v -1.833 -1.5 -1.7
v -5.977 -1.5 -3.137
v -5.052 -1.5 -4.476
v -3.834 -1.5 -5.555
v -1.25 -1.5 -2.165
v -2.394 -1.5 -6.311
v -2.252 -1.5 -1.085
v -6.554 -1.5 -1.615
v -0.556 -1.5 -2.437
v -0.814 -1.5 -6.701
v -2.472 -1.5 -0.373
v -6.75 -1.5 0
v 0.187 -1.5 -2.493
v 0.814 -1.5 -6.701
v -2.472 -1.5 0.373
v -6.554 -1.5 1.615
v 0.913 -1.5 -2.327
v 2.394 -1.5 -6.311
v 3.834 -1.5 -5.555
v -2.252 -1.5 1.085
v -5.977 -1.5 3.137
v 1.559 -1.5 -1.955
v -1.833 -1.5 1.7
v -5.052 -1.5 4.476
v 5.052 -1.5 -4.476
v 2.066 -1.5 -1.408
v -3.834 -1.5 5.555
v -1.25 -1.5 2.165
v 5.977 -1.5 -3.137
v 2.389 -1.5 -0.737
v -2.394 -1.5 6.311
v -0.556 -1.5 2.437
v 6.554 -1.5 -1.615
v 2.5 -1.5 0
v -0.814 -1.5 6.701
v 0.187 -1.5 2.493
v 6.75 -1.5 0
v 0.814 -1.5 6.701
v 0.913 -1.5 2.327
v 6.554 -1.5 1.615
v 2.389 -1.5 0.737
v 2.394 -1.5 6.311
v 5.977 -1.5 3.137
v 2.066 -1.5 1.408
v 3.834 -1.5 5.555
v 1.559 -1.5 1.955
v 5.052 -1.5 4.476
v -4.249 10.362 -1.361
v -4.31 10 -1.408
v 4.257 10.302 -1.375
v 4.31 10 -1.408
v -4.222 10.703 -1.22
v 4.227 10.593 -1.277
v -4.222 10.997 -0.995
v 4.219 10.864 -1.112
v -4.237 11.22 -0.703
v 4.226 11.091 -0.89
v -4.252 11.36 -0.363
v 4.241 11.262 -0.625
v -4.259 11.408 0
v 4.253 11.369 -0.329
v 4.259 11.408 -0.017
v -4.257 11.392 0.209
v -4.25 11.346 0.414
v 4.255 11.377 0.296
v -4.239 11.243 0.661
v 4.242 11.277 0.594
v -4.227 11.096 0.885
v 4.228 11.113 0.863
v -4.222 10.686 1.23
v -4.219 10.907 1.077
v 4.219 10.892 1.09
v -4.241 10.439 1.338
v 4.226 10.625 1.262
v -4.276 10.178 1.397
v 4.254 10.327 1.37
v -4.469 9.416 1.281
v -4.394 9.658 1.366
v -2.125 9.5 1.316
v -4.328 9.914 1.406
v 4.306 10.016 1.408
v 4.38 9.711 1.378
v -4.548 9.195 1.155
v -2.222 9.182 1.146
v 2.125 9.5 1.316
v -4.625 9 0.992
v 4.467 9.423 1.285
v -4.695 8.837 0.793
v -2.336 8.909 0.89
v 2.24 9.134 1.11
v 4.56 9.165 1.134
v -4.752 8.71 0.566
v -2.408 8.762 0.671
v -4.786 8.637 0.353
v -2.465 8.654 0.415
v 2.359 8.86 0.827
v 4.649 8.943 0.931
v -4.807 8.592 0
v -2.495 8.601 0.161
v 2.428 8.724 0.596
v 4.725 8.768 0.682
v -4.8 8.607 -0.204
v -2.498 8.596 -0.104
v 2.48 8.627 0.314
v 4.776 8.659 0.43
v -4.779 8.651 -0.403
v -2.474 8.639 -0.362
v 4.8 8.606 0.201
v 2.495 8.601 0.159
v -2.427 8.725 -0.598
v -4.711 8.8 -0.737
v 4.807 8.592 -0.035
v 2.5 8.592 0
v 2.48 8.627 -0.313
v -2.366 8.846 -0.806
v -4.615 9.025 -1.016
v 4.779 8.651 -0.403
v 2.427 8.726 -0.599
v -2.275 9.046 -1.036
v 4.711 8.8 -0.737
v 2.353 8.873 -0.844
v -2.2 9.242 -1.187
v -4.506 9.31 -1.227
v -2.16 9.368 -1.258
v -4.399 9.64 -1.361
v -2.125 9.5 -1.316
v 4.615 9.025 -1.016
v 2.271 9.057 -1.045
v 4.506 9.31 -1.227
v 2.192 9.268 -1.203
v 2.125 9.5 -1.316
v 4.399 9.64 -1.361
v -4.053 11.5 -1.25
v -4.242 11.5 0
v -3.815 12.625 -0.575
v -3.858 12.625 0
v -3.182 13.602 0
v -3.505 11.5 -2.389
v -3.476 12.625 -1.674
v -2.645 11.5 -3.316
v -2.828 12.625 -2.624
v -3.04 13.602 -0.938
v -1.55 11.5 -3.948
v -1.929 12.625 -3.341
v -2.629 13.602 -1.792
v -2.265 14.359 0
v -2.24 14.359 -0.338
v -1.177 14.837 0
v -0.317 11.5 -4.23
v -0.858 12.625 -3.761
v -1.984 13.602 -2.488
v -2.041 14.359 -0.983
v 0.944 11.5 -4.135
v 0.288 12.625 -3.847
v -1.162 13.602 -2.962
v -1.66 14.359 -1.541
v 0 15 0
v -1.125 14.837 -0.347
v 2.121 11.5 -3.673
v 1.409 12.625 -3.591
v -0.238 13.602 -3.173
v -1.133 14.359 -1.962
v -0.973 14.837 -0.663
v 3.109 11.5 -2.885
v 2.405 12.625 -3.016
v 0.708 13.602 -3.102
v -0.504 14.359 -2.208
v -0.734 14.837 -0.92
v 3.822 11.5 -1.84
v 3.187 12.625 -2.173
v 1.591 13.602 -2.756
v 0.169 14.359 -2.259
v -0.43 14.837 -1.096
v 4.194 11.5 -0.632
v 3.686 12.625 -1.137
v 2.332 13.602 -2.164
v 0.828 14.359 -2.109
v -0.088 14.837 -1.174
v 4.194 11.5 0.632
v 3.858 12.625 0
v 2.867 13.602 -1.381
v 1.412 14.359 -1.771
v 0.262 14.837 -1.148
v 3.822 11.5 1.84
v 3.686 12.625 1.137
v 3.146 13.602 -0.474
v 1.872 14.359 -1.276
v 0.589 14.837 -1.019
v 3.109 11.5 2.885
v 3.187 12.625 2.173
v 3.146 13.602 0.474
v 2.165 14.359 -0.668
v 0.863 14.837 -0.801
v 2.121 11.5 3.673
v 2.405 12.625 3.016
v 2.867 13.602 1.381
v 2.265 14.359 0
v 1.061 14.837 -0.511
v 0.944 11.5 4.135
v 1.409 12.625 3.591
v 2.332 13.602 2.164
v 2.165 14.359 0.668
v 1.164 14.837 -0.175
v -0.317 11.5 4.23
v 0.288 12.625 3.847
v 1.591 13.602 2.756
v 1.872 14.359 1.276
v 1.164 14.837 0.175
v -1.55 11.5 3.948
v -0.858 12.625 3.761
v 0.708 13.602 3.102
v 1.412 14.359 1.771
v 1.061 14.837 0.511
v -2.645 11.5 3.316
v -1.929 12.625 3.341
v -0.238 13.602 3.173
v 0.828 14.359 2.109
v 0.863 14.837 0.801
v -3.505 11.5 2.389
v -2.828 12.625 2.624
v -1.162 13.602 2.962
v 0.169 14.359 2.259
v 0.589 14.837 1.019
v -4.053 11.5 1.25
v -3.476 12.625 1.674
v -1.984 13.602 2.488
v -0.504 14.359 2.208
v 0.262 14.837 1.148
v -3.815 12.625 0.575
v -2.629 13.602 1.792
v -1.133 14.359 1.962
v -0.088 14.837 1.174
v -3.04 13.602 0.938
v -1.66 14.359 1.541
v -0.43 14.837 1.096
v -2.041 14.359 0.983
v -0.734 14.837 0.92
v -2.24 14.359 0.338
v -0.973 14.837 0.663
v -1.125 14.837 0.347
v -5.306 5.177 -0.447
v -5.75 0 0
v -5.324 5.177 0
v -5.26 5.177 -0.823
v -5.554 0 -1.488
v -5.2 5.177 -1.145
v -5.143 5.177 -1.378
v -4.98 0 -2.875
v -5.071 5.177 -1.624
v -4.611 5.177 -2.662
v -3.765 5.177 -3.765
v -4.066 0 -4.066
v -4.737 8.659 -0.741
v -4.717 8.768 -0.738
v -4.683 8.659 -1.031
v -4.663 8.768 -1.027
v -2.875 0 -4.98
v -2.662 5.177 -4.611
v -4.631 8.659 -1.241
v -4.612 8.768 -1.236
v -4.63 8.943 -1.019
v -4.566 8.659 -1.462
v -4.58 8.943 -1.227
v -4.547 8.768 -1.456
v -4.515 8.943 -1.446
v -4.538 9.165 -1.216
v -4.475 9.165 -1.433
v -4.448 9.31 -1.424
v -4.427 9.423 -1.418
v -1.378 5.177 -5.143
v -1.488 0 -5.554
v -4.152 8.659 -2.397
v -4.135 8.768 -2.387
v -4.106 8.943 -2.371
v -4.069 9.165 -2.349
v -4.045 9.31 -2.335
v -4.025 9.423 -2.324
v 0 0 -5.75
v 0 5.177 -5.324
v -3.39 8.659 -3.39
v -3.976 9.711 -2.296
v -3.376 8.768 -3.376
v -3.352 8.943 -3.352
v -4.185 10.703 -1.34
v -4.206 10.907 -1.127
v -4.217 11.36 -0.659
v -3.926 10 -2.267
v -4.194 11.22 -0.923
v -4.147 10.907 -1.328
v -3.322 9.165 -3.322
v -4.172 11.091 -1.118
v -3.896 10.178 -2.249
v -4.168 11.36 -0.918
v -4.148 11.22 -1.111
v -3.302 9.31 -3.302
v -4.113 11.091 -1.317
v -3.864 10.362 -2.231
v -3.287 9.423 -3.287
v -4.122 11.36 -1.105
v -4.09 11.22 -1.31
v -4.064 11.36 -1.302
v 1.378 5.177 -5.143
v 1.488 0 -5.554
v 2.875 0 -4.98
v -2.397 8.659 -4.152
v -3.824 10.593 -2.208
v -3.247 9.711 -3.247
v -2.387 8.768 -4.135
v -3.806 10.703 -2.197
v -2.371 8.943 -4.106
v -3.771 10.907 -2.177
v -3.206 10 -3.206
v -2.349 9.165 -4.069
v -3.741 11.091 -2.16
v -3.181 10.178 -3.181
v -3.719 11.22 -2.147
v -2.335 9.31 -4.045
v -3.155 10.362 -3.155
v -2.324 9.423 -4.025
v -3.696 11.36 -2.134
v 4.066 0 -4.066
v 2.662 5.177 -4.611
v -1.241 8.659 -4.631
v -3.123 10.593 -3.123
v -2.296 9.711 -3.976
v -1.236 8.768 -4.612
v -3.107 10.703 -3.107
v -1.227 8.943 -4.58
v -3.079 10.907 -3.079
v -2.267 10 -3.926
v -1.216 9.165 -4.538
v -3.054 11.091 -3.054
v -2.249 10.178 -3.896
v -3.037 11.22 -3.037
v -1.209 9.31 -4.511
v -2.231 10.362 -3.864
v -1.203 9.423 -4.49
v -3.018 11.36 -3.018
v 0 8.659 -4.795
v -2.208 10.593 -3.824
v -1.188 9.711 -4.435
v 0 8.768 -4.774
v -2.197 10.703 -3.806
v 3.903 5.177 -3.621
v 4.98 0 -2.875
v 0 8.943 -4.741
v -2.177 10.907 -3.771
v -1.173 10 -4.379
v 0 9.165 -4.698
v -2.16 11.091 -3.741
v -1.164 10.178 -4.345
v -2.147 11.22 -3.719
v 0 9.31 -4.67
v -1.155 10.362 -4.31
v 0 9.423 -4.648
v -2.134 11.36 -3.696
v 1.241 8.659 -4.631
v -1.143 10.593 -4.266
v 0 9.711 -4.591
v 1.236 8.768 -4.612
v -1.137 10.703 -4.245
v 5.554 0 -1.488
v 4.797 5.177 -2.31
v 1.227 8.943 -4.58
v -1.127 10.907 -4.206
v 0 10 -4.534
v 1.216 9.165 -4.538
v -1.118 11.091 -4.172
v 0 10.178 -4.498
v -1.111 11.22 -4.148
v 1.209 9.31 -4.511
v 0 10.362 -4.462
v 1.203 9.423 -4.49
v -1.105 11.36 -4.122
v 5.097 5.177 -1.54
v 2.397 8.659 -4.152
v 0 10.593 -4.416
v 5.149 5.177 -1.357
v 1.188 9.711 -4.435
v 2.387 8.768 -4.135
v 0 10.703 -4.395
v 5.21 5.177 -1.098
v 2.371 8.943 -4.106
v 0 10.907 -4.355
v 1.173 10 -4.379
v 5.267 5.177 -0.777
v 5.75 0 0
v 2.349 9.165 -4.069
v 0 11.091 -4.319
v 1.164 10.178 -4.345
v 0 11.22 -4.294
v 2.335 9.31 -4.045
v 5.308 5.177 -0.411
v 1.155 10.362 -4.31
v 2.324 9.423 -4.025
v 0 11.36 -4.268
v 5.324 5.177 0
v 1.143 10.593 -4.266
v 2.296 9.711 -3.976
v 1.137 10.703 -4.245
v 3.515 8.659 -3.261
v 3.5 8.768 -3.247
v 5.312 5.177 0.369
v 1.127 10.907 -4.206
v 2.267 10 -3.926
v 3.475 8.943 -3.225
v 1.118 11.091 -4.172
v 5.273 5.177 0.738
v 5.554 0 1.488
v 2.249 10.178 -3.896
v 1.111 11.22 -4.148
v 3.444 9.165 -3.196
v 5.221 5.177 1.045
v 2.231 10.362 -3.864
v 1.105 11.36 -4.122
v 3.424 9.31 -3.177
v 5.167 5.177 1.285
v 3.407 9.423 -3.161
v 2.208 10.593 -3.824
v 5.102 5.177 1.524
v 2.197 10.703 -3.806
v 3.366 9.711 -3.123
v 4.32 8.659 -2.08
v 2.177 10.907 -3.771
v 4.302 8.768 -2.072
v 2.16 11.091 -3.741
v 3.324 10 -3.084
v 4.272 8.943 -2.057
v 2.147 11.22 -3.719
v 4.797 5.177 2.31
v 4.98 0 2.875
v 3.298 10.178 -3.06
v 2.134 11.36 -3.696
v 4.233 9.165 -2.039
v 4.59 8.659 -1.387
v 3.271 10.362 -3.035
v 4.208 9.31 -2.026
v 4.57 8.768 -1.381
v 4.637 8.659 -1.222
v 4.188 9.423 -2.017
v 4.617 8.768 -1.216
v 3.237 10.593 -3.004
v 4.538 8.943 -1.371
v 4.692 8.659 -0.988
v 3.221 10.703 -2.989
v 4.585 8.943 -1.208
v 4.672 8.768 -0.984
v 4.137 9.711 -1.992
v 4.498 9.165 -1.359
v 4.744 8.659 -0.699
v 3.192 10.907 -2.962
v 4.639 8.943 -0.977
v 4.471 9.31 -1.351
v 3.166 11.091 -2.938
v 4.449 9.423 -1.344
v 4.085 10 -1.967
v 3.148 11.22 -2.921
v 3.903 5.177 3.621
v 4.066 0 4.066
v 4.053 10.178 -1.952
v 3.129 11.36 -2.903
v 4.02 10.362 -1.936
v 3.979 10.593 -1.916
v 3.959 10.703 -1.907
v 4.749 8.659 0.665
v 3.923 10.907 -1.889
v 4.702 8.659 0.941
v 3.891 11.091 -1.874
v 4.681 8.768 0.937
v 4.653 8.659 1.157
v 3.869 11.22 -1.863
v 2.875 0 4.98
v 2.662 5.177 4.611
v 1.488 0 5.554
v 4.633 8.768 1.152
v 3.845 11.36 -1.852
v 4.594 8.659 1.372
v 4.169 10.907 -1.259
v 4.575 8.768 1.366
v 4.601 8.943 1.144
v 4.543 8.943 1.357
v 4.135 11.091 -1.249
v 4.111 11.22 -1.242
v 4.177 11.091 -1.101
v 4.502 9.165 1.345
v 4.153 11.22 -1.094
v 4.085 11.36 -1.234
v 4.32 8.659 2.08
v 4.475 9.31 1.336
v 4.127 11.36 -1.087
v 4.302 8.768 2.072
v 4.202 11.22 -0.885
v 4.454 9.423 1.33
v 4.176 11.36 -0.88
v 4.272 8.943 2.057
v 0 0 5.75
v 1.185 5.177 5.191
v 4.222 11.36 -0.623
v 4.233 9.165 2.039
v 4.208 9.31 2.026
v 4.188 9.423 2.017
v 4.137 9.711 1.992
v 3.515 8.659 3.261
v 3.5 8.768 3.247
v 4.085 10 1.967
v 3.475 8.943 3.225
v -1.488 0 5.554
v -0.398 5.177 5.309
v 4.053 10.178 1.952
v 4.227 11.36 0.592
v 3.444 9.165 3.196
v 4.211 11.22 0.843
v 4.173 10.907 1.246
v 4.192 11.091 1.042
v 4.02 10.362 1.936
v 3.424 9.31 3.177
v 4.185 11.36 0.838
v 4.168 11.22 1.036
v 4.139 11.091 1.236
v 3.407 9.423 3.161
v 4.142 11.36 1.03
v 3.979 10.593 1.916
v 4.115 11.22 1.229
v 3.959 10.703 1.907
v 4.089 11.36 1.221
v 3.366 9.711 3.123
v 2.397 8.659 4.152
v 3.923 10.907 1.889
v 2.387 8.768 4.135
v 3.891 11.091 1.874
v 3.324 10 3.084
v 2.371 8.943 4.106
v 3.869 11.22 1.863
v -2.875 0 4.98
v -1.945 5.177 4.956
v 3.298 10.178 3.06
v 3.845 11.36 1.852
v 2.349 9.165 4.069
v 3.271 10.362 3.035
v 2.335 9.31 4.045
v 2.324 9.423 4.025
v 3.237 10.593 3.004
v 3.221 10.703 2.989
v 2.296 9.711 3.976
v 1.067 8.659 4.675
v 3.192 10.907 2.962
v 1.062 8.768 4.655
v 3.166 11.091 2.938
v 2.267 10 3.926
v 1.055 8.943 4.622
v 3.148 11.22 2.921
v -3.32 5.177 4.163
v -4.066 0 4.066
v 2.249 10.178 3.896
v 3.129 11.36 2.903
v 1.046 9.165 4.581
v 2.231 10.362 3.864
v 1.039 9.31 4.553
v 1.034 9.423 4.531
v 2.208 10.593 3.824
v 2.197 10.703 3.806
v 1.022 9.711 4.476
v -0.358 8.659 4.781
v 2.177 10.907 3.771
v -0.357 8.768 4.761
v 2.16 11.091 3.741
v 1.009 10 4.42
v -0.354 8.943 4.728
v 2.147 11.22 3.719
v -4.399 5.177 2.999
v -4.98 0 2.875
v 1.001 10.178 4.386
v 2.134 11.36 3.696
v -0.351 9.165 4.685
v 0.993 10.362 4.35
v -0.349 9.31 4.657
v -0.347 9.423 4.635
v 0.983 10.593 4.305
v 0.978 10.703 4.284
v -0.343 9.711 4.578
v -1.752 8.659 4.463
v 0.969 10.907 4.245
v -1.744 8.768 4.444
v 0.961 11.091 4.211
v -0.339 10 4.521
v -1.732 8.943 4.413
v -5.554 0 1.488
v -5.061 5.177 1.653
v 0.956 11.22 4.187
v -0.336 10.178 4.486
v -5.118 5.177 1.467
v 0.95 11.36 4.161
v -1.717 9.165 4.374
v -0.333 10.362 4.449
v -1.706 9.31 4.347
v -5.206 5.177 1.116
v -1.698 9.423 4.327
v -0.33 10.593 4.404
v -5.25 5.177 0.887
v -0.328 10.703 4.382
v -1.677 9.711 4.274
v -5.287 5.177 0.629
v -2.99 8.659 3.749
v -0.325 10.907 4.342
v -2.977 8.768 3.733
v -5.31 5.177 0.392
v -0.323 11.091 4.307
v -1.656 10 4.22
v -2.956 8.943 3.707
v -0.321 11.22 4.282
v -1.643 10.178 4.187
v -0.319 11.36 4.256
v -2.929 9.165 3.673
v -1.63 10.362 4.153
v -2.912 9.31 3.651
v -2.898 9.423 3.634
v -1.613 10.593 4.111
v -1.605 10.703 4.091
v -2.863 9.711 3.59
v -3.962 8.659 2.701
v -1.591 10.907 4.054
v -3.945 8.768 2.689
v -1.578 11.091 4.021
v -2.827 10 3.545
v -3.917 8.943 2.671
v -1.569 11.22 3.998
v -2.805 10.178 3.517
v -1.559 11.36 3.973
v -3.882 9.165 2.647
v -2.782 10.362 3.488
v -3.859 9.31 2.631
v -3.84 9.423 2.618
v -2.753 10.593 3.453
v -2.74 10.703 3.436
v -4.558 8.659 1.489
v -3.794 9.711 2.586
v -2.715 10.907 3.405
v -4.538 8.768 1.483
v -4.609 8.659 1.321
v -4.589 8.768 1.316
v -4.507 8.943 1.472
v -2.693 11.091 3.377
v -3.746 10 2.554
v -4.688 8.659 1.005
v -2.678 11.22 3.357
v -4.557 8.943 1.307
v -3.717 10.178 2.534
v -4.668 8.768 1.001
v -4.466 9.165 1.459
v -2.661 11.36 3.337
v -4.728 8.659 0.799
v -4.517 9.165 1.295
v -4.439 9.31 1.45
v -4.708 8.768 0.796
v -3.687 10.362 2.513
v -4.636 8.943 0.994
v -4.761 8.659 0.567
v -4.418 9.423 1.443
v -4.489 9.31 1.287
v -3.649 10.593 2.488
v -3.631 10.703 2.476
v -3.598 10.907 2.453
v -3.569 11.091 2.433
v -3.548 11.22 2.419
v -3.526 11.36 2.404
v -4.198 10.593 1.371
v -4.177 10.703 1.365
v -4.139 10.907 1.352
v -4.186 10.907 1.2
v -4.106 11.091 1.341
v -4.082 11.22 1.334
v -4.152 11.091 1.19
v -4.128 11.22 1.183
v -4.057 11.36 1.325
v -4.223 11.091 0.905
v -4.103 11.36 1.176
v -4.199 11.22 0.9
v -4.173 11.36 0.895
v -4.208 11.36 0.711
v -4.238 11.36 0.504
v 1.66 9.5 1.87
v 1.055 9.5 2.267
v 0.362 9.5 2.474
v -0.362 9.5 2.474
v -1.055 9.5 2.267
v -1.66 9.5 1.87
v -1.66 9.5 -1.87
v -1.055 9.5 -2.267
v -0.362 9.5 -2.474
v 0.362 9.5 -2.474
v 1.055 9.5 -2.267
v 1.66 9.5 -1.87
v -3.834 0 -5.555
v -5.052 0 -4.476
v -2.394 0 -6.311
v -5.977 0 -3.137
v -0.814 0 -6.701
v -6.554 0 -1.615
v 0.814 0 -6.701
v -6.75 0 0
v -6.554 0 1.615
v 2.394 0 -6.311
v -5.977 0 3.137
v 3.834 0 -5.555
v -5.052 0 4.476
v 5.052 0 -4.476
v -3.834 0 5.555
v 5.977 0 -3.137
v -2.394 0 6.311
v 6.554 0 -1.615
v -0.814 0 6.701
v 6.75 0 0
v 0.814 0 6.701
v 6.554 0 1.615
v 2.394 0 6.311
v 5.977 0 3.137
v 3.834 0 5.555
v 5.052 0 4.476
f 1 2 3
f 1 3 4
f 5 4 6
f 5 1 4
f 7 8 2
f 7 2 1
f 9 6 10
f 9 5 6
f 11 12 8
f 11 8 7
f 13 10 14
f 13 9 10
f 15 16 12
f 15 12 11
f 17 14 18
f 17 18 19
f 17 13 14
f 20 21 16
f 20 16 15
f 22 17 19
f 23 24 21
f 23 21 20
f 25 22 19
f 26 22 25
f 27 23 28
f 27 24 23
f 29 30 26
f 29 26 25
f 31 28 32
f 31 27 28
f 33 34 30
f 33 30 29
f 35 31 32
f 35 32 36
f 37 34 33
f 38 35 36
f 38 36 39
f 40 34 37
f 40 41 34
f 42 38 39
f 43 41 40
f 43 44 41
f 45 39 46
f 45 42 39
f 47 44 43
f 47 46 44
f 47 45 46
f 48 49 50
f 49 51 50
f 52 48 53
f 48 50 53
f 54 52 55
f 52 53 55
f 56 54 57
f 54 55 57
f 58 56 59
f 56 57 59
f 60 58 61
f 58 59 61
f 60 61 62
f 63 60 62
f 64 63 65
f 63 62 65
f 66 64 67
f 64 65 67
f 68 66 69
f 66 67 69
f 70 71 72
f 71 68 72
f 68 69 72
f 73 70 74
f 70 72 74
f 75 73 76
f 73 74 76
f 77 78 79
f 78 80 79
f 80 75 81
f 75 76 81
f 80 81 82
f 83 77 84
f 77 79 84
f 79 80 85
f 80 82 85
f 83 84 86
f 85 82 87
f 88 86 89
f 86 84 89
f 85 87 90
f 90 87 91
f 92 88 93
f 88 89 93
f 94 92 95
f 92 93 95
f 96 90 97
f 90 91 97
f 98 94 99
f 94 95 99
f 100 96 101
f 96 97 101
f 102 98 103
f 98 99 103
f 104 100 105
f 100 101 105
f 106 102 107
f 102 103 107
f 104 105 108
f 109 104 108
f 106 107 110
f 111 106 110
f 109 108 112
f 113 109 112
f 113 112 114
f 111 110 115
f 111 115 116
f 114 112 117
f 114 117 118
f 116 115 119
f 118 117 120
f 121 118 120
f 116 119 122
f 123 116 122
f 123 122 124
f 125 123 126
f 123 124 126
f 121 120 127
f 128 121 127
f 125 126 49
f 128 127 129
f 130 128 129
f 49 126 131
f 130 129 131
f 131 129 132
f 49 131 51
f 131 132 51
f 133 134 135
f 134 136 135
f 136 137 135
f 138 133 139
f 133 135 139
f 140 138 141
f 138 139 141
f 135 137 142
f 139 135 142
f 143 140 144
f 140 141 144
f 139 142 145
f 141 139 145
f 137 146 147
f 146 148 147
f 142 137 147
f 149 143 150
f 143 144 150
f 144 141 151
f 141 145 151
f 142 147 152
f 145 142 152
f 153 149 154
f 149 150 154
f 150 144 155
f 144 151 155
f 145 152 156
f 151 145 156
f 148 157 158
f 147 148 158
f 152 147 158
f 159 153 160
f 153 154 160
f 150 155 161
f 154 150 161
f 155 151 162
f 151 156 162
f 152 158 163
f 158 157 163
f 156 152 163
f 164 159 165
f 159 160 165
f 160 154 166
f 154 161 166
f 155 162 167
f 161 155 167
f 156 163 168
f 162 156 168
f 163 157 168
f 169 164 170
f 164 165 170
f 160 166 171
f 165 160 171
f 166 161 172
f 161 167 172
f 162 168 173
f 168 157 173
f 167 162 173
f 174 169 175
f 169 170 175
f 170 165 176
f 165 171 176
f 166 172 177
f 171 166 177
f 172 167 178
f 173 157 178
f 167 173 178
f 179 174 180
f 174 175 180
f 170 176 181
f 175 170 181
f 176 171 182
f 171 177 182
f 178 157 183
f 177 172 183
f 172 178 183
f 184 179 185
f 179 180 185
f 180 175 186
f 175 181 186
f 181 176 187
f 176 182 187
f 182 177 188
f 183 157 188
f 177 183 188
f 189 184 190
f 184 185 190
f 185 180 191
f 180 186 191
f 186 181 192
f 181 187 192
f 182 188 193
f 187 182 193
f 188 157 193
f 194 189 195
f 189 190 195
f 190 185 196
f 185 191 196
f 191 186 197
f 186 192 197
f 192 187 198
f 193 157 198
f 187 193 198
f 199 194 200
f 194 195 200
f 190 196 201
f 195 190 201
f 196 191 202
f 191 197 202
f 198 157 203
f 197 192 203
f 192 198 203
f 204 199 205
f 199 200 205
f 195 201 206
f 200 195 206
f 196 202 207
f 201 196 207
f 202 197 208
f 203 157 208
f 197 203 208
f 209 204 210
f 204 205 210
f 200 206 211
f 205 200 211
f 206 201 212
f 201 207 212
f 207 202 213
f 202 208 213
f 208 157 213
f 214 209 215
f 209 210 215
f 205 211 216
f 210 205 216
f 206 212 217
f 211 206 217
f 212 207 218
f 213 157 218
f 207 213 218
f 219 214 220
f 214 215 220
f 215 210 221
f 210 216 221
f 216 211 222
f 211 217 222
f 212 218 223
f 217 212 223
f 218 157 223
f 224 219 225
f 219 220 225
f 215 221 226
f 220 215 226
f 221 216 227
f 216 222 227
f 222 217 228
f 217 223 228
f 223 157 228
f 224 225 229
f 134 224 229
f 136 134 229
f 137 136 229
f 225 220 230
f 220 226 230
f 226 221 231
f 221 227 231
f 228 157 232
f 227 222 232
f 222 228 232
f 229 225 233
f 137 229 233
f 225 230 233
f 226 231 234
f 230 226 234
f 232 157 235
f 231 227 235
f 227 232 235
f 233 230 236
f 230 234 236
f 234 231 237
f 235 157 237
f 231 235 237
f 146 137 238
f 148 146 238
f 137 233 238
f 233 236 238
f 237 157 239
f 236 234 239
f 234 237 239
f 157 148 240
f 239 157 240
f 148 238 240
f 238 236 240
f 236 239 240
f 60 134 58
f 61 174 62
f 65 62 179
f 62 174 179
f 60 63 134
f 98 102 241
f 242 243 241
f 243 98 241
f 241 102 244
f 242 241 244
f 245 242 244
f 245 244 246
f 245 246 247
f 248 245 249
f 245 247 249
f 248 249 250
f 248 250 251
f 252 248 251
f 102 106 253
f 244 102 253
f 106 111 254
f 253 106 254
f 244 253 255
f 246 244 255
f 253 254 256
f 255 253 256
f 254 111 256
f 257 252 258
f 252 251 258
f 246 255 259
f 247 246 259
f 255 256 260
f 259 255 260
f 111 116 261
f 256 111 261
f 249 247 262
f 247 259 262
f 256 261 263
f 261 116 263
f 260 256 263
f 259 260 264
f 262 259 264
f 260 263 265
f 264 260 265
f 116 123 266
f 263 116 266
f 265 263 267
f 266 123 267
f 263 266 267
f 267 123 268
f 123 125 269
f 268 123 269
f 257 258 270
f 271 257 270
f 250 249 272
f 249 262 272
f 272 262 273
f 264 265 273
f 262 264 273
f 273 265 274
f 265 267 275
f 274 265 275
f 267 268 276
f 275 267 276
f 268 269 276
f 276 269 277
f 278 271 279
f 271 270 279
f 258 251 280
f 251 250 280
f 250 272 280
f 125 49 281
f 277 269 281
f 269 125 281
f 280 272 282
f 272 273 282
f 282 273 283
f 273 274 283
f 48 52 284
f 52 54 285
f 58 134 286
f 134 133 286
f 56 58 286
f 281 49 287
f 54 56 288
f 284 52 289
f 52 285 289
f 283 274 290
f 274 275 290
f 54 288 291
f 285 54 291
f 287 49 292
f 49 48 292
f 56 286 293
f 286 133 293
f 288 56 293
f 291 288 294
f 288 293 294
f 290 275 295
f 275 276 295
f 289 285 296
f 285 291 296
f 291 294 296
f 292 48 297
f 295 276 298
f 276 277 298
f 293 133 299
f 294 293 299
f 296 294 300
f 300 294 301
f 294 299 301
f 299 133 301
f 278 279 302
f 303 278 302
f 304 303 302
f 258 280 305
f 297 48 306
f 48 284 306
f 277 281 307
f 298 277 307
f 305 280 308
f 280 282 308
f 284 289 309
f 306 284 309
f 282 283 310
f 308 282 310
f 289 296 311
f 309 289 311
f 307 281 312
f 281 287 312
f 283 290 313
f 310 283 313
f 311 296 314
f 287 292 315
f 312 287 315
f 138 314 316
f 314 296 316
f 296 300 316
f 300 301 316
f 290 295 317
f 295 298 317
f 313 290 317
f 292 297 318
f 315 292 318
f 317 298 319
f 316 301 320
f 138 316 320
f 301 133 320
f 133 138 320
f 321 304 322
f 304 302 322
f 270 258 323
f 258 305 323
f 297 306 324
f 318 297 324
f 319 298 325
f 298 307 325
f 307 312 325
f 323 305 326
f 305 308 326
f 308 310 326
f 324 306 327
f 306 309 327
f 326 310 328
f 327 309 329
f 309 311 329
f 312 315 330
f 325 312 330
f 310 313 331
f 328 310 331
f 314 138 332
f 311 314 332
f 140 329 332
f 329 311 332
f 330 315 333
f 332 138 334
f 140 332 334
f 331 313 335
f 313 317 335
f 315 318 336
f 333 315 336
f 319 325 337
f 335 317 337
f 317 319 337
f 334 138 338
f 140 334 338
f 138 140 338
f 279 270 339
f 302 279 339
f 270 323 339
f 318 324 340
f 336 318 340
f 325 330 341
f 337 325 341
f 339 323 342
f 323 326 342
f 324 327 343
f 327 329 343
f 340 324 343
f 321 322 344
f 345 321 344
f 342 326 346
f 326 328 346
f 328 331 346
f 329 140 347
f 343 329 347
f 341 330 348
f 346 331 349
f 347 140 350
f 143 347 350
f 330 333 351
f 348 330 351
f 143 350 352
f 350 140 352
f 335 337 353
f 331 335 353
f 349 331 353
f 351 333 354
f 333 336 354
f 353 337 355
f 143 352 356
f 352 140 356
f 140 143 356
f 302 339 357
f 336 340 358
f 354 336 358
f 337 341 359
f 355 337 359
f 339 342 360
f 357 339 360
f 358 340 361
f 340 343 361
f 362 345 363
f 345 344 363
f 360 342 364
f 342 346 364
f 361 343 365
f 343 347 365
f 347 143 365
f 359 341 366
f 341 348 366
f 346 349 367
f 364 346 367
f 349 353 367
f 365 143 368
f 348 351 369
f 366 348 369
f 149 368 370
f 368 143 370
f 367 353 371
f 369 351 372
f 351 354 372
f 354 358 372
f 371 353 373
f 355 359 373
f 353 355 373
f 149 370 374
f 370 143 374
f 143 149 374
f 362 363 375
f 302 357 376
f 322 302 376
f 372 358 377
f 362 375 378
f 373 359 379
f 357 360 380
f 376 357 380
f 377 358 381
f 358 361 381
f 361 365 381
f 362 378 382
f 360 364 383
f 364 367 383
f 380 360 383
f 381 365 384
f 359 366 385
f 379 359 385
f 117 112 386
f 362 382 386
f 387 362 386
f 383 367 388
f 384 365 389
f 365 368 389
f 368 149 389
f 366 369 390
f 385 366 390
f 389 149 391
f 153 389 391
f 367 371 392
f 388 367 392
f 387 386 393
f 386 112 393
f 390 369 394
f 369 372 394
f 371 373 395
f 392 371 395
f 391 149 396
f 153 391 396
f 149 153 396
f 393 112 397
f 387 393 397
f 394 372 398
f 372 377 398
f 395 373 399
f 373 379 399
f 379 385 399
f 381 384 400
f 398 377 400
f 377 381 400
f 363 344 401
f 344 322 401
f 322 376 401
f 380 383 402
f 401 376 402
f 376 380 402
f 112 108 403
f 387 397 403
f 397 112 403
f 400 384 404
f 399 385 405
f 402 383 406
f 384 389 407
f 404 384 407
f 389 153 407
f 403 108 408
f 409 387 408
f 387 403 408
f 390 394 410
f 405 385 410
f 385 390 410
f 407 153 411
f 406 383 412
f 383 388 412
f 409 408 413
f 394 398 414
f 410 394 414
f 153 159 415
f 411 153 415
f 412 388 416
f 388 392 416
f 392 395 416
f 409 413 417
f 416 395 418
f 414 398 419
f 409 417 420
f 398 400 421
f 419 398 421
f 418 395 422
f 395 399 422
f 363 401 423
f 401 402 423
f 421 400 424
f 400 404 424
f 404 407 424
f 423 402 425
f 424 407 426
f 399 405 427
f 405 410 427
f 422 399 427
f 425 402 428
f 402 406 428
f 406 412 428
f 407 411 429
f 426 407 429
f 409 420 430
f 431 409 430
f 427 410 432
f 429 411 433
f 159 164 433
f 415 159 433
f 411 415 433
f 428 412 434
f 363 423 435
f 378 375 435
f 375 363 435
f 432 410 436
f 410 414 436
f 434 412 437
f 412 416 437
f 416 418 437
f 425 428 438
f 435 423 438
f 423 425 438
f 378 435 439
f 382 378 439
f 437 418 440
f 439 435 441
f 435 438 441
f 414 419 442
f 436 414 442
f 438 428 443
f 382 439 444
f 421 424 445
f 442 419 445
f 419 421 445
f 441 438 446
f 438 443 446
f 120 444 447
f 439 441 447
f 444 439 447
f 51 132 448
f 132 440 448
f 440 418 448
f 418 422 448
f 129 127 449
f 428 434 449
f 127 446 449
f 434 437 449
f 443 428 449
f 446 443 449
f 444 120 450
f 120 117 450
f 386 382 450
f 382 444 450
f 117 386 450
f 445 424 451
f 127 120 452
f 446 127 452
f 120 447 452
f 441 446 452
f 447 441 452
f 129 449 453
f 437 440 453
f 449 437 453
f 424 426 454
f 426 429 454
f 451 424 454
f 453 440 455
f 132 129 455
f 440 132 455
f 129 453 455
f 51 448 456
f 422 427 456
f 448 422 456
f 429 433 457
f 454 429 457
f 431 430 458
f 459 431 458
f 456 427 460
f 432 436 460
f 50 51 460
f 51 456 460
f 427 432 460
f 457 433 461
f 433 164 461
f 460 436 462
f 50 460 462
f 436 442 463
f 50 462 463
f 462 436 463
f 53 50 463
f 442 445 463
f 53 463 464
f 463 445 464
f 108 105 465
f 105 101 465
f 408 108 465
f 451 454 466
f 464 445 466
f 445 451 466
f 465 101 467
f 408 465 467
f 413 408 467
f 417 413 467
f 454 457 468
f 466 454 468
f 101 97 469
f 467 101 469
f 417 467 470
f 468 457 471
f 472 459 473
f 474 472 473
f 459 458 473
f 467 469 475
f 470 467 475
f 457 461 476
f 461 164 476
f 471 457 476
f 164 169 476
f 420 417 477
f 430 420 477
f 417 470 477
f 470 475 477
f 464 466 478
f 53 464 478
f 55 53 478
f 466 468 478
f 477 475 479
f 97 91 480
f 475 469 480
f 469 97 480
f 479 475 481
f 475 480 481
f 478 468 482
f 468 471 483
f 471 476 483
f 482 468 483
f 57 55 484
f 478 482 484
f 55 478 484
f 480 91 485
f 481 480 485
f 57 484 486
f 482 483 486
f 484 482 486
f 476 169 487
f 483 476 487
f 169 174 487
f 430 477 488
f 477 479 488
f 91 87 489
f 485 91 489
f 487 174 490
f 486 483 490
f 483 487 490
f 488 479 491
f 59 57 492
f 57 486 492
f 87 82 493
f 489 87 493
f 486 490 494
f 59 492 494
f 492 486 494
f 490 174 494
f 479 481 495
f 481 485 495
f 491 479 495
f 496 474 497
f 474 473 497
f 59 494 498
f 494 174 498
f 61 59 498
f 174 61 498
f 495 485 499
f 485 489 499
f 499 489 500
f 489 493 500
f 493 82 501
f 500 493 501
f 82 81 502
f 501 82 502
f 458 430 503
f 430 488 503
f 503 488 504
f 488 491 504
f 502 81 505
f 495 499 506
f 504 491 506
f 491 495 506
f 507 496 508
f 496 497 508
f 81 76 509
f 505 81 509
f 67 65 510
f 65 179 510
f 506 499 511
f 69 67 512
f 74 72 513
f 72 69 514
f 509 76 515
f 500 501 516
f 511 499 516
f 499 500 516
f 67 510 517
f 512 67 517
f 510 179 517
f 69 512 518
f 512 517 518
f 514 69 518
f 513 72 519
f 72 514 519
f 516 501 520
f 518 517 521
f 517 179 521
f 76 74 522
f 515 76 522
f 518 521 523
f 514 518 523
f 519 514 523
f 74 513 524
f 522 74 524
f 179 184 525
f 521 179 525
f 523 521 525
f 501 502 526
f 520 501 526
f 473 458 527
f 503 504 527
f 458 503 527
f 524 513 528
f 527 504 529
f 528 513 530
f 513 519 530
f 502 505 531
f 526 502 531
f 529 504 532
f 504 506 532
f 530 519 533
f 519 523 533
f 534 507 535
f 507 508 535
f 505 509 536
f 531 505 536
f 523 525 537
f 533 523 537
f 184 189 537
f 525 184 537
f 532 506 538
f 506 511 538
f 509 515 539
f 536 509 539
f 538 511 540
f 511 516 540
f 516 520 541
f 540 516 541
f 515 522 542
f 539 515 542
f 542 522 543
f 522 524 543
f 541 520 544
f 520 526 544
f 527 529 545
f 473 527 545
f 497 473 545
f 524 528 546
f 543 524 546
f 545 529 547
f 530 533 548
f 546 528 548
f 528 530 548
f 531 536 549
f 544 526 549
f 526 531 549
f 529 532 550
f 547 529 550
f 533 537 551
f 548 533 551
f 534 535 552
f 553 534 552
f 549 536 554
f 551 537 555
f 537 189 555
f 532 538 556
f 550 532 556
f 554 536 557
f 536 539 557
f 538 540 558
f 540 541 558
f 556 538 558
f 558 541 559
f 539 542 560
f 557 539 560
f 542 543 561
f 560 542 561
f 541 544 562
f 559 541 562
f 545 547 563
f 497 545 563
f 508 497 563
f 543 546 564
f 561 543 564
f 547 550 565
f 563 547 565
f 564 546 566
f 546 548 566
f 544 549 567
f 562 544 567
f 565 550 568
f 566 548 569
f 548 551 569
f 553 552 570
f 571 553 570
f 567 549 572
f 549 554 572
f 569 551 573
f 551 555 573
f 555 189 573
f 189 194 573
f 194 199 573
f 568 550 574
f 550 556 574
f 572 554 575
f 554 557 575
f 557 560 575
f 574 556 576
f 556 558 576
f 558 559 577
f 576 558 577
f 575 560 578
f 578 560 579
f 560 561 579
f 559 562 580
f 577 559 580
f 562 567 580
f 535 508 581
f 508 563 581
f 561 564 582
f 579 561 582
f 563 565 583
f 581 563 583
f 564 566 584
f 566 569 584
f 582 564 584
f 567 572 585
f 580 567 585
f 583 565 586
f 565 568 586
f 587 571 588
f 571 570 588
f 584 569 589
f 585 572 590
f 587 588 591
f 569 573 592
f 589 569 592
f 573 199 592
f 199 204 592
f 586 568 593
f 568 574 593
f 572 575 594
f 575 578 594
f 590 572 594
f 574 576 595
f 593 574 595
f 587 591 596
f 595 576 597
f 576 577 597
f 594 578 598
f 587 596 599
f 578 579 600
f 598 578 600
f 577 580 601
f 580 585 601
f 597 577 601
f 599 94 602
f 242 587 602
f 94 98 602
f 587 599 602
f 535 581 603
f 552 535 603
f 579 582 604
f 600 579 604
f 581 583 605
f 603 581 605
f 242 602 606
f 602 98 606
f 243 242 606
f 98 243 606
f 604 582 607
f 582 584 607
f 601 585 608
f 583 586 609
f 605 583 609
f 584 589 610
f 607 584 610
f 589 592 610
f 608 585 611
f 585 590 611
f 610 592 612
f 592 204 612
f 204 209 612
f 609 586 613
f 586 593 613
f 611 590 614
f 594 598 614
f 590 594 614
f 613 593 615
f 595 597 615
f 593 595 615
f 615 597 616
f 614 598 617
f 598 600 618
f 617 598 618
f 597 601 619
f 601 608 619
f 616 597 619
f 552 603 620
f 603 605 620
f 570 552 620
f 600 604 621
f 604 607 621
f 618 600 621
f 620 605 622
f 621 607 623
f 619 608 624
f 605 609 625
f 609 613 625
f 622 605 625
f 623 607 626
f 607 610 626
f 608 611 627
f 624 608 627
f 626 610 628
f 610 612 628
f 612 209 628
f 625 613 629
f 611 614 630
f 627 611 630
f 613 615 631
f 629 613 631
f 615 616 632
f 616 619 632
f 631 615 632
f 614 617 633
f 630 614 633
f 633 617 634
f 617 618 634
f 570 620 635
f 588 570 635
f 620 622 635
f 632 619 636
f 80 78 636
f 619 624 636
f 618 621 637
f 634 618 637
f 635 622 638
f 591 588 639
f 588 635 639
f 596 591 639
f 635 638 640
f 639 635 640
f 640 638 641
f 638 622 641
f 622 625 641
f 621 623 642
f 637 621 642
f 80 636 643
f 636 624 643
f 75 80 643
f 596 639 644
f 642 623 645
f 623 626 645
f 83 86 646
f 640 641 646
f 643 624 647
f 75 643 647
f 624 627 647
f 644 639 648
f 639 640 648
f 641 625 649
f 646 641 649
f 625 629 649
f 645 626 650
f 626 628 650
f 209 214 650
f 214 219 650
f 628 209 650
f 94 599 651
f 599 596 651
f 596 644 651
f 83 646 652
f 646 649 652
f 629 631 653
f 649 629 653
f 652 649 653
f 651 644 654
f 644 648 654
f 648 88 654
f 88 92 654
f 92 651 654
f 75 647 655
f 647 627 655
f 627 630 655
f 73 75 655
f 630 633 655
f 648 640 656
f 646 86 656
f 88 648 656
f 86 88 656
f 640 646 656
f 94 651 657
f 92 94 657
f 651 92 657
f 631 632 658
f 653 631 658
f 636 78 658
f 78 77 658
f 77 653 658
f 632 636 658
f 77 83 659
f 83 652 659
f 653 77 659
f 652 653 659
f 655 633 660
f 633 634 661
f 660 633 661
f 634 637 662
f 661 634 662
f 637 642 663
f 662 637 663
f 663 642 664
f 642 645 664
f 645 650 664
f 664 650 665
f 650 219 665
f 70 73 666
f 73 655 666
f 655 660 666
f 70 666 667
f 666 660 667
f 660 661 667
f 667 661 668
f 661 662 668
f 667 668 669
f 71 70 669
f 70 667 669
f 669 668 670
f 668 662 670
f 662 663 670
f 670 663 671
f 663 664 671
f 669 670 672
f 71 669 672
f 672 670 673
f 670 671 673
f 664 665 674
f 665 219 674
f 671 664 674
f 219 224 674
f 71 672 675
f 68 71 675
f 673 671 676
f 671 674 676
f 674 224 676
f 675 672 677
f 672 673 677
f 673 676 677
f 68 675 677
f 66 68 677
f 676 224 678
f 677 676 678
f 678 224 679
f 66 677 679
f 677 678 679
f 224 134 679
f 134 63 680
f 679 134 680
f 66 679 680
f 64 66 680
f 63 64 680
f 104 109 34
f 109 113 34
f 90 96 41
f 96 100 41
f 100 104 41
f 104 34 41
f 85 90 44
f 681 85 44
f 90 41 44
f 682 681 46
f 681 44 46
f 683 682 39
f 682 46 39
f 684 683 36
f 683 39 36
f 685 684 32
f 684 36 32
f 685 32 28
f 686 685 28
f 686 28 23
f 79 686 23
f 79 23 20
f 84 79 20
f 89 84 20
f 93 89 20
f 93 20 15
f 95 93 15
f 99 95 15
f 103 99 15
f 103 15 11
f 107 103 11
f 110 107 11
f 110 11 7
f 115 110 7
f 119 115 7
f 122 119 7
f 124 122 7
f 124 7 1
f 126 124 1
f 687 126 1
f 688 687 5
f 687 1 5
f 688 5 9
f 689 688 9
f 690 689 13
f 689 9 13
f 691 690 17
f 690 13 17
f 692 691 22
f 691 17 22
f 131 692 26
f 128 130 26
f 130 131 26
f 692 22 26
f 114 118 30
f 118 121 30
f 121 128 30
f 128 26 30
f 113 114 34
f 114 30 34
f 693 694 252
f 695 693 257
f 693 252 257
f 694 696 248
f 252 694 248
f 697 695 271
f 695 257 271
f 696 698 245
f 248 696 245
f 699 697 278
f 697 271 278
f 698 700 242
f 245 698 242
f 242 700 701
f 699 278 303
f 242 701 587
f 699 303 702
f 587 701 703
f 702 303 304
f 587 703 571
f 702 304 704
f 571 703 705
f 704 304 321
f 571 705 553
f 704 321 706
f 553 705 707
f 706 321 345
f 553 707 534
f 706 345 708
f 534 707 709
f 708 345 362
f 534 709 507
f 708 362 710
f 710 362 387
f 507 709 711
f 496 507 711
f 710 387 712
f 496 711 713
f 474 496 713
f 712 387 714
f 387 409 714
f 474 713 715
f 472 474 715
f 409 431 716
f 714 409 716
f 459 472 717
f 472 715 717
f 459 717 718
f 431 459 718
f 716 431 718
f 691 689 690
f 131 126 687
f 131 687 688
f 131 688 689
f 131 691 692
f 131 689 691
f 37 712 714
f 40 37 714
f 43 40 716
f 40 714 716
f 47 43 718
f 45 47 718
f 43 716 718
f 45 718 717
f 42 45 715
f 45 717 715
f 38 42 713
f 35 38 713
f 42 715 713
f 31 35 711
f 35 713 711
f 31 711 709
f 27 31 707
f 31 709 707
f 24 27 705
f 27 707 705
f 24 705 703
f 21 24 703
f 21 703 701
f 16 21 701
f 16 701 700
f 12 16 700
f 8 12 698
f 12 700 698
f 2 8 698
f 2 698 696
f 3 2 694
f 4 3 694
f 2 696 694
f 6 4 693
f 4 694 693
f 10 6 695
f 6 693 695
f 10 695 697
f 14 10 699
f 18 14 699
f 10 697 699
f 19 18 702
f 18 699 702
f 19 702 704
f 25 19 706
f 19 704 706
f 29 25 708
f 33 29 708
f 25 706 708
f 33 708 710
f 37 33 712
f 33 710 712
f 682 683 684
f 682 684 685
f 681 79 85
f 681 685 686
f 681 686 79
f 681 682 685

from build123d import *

# Parameters (mm, degrees)
SKETCH3_R               = 6.75
BOSS_EXTRUDE1_DEPTH     = 1.5
SKETCH5_R               = 2.5
CUT_EXTRUDE1_DEPTH      = 11
SKETCH6_R               = 1.408145202
CUT_EXTRUDE2_DEPTH      = 7.75
CUT_EXTRUDE2_DEPTH_BACK = 7.75


with BuildPart() as part:
    # Sketch1 → Revolve1 (revolve)
    with BuildSketch(Plane.XY):
        with BuildLine():
            Line((0, 0), (-5.75, 0))
            add(Edge.make_bspline(
                [(-5.75, 0), (-5.385455056, 6.49991136), (-4.801363332, 8.498230235), (-4.241672522, 11.5)],
                knots=[0, 0, 0, 0, 1, 1, 1, 1], degree=3))
            ThreePointArc((-4.241672522, 11.5), (-2.749626601, 14.012035059), (0, 15))
            Line((0, 15), (0, 0))
        make_face()
    revolve(axis=Axis((0, 15, 0), (0, -1, 0)))

    # Sketch3 → Boss-Extrude1 (add)
    with BuildSketch(Plane.XZ):
        Circle(SKETCH3_R)
    extrude(amount=BOSS_EXTRUDE1_DEPTH)

    # Sketch5 → Cut-Extrude1 (cut)
    with BuildSketch(Plane.XZ.offset(1.5)):
        Circle(SKETCH5_R)
    extrude(amount=-CUT_EXTRUDE1_DEPTH, mode=Mode.SUBTRACT)

    # Sketch6 → Cut-Extrude2 (cut, two sides)
    with BuildSketch(Plane(origin=(0, 0, 0), x_dir=(0, 0, -1), z_dir=(1, 0, 0))) as cut_extrude2_sk:
        with Locations((0, 10)):
            Circle(SKETCH6_R)
    extrude(amount=CUT_EXTRUDE2_DEPTH, mode=Mode.SUBTRACT)
    extrude(cut_extrude2_sk.sketch, amount=-CUT_EXTRUDE2_DEPTH_BACK, mode=Mode.SUBTRACT)


solid = part.part
